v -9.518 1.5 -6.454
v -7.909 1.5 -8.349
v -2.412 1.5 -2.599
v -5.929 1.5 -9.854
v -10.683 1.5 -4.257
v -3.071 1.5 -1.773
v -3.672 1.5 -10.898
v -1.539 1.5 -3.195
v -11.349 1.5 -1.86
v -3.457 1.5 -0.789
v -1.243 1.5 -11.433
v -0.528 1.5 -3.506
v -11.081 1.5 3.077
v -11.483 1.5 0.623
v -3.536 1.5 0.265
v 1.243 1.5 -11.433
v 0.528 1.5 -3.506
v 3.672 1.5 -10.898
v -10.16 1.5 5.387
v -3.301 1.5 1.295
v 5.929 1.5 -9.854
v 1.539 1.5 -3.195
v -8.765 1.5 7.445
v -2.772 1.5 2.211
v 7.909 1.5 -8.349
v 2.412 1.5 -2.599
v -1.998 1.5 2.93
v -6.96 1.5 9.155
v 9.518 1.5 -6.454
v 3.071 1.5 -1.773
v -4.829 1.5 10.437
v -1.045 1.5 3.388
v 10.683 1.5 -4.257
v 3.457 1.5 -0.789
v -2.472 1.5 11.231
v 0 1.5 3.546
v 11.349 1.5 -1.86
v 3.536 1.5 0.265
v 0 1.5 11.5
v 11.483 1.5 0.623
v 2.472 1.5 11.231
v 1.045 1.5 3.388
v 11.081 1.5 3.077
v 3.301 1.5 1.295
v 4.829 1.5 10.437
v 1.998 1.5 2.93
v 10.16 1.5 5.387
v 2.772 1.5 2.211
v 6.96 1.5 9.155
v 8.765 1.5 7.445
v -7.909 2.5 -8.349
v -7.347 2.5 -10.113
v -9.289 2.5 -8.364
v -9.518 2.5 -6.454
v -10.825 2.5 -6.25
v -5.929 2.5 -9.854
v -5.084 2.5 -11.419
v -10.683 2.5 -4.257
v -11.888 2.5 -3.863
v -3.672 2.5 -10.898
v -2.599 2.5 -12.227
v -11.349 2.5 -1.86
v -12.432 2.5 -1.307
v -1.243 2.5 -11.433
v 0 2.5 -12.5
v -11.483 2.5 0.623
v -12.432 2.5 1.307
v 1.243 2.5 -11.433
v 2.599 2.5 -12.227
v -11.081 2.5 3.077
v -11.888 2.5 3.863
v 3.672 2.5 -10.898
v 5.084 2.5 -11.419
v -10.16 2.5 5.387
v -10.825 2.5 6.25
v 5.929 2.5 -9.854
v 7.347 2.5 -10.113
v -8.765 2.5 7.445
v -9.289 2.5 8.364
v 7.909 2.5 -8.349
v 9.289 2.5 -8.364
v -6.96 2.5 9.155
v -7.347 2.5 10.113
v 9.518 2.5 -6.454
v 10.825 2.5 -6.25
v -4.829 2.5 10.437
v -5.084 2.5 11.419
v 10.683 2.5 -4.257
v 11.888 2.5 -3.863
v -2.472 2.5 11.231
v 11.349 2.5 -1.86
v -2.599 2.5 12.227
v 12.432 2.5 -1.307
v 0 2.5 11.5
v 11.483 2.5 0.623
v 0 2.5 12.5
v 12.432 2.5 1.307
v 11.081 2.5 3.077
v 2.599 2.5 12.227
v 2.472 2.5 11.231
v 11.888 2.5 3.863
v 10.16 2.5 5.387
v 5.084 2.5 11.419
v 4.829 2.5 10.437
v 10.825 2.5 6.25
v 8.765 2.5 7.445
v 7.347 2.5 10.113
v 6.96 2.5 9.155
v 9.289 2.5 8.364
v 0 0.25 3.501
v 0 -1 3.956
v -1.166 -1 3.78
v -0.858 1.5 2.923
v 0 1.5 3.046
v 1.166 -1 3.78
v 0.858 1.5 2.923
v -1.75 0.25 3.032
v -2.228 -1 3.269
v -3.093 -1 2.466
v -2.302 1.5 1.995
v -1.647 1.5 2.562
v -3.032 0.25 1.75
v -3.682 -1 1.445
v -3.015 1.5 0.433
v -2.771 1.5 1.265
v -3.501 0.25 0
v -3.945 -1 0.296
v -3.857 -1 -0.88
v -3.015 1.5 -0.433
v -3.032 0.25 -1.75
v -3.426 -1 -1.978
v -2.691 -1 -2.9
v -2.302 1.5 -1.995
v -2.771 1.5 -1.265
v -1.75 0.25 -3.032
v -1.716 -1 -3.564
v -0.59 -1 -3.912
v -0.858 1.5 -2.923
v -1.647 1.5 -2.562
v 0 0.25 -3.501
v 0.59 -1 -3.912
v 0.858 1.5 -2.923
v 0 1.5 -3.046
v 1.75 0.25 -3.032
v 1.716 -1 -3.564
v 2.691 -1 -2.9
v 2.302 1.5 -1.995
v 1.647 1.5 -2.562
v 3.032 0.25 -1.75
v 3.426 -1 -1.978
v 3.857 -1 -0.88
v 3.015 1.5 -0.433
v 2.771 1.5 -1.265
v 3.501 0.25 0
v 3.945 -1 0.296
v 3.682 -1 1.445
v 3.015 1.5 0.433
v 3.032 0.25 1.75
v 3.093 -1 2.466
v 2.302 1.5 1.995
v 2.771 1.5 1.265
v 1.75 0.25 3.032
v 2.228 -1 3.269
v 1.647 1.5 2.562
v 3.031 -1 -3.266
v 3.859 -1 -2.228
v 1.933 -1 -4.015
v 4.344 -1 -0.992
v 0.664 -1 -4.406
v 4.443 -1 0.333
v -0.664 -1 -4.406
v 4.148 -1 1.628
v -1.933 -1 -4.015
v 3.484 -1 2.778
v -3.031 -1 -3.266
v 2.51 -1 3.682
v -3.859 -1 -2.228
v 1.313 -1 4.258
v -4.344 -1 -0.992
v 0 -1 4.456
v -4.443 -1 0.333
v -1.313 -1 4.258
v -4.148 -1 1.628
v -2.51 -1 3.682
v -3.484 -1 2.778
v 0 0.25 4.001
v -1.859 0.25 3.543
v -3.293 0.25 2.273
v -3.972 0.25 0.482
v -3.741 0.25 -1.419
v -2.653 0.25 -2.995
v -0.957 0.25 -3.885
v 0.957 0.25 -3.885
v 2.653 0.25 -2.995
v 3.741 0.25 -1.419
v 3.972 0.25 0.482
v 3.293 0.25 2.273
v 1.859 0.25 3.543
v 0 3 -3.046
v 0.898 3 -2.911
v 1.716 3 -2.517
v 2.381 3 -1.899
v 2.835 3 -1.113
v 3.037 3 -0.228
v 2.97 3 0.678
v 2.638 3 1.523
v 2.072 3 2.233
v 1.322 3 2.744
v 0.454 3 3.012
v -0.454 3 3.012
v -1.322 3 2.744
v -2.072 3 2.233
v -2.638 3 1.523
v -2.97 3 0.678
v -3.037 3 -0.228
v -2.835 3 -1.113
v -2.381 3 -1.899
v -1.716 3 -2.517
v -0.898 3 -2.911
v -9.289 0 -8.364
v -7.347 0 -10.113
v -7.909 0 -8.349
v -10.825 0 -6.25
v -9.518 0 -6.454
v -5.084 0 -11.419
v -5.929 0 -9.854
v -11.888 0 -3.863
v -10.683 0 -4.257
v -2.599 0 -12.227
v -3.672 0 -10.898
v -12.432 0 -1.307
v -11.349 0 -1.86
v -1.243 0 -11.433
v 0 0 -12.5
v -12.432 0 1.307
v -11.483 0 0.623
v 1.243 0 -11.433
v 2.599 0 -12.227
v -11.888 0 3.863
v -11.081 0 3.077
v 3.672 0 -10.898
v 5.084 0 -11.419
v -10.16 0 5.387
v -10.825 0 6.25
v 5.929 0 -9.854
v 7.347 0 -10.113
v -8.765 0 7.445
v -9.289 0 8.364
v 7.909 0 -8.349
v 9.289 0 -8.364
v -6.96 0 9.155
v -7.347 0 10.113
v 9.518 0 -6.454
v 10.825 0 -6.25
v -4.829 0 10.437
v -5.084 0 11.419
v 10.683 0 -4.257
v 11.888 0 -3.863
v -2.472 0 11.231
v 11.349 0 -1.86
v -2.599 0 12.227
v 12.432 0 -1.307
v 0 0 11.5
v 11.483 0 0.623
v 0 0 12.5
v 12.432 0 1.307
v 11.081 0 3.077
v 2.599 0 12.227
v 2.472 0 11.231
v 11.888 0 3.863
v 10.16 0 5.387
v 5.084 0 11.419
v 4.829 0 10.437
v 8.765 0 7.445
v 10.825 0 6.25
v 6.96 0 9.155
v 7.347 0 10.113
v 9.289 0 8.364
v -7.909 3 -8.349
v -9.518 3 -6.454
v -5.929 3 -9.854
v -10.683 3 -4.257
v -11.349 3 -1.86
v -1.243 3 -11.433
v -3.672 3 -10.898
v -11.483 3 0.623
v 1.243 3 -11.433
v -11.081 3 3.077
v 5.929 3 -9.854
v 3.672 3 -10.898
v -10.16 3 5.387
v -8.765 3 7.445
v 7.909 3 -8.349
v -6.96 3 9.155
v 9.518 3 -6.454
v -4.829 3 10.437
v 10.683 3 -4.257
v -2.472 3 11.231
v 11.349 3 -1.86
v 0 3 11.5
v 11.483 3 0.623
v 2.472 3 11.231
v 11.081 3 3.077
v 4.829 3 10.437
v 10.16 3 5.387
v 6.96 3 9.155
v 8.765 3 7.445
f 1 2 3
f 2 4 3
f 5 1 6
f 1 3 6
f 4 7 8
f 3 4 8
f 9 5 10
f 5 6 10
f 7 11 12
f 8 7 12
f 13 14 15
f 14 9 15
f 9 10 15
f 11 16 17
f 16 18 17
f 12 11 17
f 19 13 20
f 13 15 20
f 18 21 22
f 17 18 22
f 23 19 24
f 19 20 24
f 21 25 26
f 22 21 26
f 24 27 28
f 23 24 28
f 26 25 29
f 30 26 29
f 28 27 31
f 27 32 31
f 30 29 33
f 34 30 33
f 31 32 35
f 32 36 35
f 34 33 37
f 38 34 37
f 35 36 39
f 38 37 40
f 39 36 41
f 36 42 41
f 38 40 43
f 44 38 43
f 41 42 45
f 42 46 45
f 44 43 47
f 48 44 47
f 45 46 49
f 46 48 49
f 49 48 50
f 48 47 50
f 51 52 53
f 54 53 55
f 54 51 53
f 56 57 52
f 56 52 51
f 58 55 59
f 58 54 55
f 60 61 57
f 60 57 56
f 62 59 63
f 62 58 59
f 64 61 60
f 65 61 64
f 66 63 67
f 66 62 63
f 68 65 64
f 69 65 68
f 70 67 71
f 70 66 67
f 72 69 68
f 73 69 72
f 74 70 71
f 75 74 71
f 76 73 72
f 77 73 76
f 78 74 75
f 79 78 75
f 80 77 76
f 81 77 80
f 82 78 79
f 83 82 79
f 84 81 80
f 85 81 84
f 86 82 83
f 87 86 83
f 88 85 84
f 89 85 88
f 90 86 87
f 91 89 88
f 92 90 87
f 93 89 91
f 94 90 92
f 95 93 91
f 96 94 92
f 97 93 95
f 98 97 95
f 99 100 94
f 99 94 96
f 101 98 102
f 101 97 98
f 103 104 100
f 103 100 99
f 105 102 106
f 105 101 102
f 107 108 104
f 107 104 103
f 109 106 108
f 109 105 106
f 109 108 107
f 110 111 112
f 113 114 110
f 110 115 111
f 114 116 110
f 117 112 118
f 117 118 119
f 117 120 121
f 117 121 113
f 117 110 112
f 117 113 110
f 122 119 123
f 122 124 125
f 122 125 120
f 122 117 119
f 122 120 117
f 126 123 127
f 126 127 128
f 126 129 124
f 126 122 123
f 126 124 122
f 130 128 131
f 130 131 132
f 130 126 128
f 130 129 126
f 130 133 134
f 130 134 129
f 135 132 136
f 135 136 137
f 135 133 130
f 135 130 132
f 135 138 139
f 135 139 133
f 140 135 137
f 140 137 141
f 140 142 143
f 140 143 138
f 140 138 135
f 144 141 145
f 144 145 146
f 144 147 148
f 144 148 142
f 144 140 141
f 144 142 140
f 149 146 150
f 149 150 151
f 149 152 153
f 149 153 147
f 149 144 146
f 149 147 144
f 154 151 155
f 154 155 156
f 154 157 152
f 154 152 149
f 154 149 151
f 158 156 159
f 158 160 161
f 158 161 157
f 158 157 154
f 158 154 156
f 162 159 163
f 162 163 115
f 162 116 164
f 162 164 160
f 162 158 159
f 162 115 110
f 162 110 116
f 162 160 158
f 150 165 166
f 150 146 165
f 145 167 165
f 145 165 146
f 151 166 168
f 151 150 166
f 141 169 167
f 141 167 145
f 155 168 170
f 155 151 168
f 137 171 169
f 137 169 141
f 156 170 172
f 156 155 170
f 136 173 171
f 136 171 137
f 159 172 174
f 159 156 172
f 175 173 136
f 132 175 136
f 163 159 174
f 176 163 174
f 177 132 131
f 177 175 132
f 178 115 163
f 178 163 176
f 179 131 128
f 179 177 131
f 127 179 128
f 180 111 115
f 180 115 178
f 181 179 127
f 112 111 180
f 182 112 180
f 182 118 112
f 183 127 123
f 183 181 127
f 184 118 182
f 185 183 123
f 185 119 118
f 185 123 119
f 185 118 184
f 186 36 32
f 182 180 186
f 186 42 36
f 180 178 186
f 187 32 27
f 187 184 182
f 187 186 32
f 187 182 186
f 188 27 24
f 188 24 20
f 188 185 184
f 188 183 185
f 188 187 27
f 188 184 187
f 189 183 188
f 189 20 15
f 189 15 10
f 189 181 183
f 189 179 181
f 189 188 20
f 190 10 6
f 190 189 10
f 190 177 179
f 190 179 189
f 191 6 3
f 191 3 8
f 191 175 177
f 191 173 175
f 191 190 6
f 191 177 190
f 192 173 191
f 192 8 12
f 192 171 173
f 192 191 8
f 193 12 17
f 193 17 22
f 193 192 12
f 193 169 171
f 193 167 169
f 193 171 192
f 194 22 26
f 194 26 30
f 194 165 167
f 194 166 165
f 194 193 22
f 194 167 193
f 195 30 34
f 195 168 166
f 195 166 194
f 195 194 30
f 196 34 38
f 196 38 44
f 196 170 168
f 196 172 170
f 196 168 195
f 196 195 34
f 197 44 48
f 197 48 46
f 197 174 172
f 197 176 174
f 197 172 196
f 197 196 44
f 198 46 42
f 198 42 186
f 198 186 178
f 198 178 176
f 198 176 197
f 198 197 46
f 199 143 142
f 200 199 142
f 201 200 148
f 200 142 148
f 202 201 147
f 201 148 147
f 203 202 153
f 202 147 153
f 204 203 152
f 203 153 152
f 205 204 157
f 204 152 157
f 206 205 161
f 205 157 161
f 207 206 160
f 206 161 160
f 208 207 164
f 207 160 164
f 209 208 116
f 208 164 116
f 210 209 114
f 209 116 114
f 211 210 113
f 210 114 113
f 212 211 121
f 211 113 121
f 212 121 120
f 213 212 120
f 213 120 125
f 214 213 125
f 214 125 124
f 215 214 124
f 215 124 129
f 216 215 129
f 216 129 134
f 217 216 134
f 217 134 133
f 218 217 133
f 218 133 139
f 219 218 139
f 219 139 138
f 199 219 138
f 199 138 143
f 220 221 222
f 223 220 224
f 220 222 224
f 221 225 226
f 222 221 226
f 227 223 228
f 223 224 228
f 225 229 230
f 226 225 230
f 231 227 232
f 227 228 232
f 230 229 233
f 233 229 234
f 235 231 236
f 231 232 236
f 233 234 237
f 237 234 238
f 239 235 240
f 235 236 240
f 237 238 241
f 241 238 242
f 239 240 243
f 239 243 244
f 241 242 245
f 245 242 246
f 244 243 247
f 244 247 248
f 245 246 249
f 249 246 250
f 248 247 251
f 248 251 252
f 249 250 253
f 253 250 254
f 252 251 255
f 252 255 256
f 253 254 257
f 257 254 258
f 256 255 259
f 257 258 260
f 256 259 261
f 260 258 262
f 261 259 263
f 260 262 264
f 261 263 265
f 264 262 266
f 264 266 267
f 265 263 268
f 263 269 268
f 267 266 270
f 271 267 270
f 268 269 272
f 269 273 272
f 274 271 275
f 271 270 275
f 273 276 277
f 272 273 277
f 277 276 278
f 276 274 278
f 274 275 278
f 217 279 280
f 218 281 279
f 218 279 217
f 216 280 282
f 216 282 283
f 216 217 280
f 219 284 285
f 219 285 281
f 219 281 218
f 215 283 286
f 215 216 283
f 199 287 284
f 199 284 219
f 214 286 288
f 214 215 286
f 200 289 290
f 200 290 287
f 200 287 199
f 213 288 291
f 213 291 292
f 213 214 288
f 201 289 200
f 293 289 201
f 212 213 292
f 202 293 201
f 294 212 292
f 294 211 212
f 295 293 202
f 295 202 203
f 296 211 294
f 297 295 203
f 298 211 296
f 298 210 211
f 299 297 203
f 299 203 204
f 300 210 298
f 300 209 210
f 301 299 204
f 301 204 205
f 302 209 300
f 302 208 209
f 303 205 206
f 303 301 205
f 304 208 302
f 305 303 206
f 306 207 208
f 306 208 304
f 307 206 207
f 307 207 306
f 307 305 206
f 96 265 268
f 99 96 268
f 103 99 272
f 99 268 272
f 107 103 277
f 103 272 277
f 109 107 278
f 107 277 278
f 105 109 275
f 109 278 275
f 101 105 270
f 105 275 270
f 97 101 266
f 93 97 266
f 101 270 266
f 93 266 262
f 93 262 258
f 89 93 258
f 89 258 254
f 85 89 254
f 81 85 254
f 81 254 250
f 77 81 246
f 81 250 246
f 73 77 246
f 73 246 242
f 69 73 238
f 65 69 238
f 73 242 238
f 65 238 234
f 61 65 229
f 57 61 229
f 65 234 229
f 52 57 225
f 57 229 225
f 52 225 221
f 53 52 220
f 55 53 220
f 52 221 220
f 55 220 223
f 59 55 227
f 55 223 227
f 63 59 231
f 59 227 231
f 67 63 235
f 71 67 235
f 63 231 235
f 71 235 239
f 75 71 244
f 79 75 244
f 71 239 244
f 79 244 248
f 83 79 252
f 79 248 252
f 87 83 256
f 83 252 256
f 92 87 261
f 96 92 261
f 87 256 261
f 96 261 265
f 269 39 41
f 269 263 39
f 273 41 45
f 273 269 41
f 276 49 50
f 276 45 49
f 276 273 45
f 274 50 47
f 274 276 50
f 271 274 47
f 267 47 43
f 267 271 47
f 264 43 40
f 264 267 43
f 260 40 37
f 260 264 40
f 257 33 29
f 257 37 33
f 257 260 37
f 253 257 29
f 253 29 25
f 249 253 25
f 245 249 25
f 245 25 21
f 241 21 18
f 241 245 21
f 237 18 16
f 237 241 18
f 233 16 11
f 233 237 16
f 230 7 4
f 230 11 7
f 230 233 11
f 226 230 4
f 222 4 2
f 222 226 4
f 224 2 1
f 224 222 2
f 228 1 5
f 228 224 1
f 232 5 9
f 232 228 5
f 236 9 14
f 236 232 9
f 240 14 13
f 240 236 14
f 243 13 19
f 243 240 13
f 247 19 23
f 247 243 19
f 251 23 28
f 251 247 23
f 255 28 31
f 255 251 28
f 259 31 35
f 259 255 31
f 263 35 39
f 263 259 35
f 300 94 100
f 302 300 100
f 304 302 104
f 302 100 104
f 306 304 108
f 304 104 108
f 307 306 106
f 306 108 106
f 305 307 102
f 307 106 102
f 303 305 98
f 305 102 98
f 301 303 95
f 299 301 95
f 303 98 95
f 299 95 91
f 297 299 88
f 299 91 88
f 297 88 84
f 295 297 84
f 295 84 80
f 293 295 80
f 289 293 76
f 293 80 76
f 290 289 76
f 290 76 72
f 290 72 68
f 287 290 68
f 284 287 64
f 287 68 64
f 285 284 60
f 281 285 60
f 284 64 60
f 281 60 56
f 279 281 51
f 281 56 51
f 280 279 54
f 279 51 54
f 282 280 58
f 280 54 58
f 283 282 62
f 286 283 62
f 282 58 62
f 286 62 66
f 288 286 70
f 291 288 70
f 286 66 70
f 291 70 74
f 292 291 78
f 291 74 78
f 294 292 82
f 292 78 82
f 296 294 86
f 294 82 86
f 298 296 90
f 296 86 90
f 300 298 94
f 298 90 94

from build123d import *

# Parameters (mm, degrees)
SKETCH1_R           = 12.5
BOSS_EXTRUDE1_DEPTH = 2.5
SHELL1_T            = -1
SKETCH2_R           = 11.5
BOSS_EXTRUDE2_DEPTH = 0.5
SKETCH5_R           = 3.045955351
CUT_EXTRUDE3_DEPTH  = 10.5


with BuildPart() as part:
    # Sketch1 → Boss-Extrude1 (new body)
    with BuildSketch(Plane(origin=(0, 0, 0), x_dir=(1, 0, 0), z_dir=(0, 1, 0))):
        with Locations(Location((0, 0, 0), (0, 0, 270))):
            Circle(SKETCH1_R)
    extrude(amount=BOSS_EXTRUDE1_DEPTH)

    # Shell1
    shell1_openings = [part.faces().sort_by_distance(p)[0] for p in [
        (0, 0, 0),
    ]]
    offset(amount=SHELL1_T, openings=shell1_openings, kind=Kind.INTERSECTION)

    # Sketch2 → Boss-Extrude2 (add)
    with BuildSketch(Plane(origin=(0, 2.5, 0), x_dir=(1, 0, 0), z_dir=(0, 1, 0))):
        with Locations(Location((0, 0, 0), (0, 0, 270))):
            Circle(SKETCH2_R)
    extrude(amount=BOSS_EXTRUDE2_DEPTH)

    # Sketch4 → Revolve1 (revolve)
    with BuildSketch(Plane.XY, mode=Mode.PRIVATE) as revolve1_sk:
        Polygon((4.455880937, -1), (3.955880937, -1), (2.5, 3), (3, 3), align=None)
    revolve(revolve1_sk.sketch.rotate(Axis((0, 3, 0), (0, -1, 0)), 90), axis=Axis((0, 3, 0), (0, -1, 0)))

    # Sketch5 → Cut-Extrude3 (cut)
    with BuildSketch(Plane.XZ.offset(-1.5)):
        with Locations(Location((0, 0, 0), (0, 0, 270))):
            Circle(SKETCH5_R)
    extrude(amount=-CUT_EXTRUDE3_DEPTH, mode=Mode.SUBTRACT)


solid = part.part
